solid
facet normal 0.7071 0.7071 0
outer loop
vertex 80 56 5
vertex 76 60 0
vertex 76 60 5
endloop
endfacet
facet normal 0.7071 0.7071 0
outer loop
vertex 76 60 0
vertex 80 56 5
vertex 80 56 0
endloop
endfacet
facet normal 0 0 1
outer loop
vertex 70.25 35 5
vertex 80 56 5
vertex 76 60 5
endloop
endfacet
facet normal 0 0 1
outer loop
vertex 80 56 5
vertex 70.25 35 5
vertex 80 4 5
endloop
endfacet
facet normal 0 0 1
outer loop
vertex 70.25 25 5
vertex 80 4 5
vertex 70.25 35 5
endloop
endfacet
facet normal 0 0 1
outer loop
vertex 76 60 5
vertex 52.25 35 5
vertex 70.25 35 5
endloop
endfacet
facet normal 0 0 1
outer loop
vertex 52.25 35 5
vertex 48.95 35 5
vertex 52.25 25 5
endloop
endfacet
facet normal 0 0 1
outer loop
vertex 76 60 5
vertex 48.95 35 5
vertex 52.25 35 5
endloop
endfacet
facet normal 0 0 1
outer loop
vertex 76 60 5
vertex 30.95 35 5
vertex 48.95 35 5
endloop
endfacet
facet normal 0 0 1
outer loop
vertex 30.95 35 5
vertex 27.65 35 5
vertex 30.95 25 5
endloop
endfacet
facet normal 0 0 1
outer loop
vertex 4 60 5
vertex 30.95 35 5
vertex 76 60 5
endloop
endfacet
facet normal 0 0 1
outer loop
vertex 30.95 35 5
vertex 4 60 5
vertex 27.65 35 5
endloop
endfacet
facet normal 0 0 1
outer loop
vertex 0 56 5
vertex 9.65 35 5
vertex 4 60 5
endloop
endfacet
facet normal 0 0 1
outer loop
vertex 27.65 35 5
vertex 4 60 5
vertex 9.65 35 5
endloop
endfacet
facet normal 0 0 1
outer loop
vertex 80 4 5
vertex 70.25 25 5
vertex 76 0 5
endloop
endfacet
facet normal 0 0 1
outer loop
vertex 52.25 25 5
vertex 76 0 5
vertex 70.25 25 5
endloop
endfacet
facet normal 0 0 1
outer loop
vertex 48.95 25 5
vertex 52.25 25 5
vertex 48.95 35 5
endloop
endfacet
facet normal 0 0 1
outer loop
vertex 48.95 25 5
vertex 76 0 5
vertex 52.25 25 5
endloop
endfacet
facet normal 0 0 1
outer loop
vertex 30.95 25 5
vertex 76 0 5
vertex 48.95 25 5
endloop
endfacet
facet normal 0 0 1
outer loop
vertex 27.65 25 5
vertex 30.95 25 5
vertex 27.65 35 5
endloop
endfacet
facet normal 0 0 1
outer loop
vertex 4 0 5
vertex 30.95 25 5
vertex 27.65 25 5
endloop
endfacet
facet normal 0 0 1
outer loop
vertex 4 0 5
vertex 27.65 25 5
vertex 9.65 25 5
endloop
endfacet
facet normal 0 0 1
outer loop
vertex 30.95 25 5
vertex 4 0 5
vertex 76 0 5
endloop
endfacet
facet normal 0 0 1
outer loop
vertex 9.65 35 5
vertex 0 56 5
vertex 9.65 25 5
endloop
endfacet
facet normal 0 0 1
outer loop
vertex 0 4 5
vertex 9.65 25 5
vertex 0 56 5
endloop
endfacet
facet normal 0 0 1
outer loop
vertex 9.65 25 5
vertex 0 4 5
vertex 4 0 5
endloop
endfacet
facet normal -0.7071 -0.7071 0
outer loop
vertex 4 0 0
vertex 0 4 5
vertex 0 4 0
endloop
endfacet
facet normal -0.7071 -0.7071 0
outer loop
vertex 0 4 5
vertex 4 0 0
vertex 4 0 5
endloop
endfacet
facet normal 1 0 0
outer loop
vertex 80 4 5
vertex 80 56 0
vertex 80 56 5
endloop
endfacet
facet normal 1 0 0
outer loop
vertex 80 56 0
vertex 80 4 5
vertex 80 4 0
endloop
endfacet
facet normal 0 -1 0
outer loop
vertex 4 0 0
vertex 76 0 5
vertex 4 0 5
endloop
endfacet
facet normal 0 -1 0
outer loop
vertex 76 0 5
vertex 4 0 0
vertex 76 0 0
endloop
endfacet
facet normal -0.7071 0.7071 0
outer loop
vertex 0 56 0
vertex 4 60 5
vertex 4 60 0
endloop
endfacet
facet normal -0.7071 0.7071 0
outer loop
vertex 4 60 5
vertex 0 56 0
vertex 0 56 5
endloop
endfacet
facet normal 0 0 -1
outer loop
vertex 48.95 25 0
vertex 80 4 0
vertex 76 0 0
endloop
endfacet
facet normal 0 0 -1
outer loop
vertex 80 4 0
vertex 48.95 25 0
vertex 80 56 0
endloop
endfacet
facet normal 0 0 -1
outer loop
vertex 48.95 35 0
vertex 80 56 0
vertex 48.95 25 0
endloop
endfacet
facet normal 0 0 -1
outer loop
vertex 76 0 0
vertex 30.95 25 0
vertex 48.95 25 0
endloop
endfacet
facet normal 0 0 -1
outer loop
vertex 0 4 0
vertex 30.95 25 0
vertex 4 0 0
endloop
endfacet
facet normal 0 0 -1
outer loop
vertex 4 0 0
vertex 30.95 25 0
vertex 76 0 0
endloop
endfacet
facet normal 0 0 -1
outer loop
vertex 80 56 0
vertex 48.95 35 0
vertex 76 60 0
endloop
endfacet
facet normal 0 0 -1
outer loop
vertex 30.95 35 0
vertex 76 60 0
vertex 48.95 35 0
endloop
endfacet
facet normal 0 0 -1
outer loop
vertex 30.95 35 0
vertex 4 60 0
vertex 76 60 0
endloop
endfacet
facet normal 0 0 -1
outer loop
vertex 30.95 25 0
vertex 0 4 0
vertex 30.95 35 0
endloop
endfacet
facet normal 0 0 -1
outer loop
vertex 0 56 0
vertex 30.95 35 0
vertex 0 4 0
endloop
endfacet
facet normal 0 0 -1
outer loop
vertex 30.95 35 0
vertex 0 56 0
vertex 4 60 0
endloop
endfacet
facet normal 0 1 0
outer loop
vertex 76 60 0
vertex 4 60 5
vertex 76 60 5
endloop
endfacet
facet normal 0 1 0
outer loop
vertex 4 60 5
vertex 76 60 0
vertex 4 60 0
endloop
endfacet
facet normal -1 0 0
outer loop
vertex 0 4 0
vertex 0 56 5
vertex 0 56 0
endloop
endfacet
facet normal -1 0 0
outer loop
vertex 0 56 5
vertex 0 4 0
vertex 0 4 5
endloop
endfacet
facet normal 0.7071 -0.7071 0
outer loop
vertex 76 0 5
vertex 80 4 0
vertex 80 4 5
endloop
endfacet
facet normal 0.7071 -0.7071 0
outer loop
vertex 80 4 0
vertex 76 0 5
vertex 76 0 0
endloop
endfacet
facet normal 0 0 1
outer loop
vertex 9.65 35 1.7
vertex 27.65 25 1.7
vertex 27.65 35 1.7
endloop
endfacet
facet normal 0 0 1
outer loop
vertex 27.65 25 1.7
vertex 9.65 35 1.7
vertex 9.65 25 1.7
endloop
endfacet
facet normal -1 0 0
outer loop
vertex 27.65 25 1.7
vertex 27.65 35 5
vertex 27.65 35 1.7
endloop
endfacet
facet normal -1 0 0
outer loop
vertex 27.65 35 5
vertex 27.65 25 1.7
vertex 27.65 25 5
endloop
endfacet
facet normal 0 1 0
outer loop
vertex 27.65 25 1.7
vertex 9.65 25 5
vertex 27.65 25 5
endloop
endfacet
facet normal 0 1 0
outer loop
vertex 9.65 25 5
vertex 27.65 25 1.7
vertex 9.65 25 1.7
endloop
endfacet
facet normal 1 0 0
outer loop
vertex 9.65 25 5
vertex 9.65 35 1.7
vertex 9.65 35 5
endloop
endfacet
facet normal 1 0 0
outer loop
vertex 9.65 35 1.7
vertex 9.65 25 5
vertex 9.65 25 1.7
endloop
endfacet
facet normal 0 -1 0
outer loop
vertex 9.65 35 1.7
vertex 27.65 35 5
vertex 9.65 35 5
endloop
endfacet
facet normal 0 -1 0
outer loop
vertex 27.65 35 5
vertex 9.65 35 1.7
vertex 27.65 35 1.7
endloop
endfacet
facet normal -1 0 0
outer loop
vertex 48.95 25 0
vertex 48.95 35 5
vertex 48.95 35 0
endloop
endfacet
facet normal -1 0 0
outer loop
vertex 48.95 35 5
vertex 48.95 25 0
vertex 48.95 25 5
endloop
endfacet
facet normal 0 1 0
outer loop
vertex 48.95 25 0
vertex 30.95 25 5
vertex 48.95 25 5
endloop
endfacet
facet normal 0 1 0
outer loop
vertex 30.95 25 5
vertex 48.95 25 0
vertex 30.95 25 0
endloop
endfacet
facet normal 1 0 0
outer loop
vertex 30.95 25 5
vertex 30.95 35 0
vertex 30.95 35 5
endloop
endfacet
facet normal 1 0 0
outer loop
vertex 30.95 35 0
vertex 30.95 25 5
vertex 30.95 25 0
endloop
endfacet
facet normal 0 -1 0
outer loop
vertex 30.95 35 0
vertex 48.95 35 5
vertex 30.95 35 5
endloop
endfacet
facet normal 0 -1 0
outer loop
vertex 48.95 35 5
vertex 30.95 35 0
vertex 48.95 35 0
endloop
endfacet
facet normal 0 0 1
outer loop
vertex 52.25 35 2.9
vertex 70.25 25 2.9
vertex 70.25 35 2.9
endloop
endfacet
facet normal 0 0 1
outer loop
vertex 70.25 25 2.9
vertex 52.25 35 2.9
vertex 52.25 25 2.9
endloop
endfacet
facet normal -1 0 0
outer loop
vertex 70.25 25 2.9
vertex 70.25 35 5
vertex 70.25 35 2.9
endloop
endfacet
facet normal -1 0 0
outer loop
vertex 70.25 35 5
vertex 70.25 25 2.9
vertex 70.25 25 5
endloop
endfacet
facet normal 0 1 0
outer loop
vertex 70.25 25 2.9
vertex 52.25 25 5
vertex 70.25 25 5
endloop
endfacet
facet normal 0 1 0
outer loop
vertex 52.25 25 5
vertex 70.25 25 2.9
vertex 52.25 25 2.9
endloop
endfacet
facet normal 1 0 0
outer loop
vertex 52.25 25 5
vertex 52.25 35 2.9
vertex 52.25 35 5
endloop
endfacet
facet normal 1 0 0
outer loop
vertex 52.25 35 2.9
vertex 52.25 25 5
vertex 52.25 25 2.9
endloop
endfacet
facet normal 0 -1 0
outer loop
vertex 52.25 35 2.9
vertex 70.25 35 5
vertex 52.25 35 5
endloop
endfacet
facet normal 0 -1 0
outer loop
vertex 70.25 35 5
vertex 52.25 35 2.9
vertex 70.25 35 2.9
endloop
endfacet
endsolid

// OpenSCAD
$fn = 32;

// ----------------------------------------------------------------------
// Windowed plate: 3 voids, 80 x 60 x 5 mm
// ----------------------------------------------------------------------

// --- parameters (mm) ---
plate_l = 80;             // plate length, X
plate_w = 60;             // plate width, Y
plate_t = 5;              // plate thickness, Z
edge_margin = 8;          // wall from the plate edge to any window
windows = 3;              // number of windows in the row
win_l = 18;               // window length
win_w = 10;               // window width
win_pitch = 21.3;         // window pitch along X
depth_1 = 3.3;            // depth of void 1 (full thickness = through)
depth_2 = 5;              // depth of void 2 (full thickness = through)
depth_3 = 2.1;            // depth of void 3 (full thickness = through)
corner_c = 4;             // corner chamfer of the plate

profile = [[4, 0], [76, 0], [80, 4], [80, 56], [76, 60], [4, 60], [0, 56], [0, 4]];  // primary outline, 8 points, counter clockwise
void_1 = [[9.65, 25], [27.65, 25], [27.65, 35], [9.65, 35]];  // window 1 of the row, 4 points
void_2 = [[30.95, 25], [48.95, 25], [48.95, 35], [30.95, 35]];  // window 2 of the row, 4 points
void_3 = [[52.25, 25], [70.25, 25], [70.25, 35], [52.25, 35]];  // window 3 of the row, 4 points

// --- the one profile operation ---
difference() {
  linear_extrude(height = plate_t) polygon(points = profile);
  translate([0, 0, plate_t - depth_1])
    linear_extrude(height = depth_1 + 1) polygon(points = void_1);
  translate([0, 0, -1])
    linear_extrude(height = plate_t + 2) polygon(points = void_2);
  translate([0, 0, plate_t - depth_3])
    linear_extrude(height = depth_3 + 1) polygon(points = void_3);
}
